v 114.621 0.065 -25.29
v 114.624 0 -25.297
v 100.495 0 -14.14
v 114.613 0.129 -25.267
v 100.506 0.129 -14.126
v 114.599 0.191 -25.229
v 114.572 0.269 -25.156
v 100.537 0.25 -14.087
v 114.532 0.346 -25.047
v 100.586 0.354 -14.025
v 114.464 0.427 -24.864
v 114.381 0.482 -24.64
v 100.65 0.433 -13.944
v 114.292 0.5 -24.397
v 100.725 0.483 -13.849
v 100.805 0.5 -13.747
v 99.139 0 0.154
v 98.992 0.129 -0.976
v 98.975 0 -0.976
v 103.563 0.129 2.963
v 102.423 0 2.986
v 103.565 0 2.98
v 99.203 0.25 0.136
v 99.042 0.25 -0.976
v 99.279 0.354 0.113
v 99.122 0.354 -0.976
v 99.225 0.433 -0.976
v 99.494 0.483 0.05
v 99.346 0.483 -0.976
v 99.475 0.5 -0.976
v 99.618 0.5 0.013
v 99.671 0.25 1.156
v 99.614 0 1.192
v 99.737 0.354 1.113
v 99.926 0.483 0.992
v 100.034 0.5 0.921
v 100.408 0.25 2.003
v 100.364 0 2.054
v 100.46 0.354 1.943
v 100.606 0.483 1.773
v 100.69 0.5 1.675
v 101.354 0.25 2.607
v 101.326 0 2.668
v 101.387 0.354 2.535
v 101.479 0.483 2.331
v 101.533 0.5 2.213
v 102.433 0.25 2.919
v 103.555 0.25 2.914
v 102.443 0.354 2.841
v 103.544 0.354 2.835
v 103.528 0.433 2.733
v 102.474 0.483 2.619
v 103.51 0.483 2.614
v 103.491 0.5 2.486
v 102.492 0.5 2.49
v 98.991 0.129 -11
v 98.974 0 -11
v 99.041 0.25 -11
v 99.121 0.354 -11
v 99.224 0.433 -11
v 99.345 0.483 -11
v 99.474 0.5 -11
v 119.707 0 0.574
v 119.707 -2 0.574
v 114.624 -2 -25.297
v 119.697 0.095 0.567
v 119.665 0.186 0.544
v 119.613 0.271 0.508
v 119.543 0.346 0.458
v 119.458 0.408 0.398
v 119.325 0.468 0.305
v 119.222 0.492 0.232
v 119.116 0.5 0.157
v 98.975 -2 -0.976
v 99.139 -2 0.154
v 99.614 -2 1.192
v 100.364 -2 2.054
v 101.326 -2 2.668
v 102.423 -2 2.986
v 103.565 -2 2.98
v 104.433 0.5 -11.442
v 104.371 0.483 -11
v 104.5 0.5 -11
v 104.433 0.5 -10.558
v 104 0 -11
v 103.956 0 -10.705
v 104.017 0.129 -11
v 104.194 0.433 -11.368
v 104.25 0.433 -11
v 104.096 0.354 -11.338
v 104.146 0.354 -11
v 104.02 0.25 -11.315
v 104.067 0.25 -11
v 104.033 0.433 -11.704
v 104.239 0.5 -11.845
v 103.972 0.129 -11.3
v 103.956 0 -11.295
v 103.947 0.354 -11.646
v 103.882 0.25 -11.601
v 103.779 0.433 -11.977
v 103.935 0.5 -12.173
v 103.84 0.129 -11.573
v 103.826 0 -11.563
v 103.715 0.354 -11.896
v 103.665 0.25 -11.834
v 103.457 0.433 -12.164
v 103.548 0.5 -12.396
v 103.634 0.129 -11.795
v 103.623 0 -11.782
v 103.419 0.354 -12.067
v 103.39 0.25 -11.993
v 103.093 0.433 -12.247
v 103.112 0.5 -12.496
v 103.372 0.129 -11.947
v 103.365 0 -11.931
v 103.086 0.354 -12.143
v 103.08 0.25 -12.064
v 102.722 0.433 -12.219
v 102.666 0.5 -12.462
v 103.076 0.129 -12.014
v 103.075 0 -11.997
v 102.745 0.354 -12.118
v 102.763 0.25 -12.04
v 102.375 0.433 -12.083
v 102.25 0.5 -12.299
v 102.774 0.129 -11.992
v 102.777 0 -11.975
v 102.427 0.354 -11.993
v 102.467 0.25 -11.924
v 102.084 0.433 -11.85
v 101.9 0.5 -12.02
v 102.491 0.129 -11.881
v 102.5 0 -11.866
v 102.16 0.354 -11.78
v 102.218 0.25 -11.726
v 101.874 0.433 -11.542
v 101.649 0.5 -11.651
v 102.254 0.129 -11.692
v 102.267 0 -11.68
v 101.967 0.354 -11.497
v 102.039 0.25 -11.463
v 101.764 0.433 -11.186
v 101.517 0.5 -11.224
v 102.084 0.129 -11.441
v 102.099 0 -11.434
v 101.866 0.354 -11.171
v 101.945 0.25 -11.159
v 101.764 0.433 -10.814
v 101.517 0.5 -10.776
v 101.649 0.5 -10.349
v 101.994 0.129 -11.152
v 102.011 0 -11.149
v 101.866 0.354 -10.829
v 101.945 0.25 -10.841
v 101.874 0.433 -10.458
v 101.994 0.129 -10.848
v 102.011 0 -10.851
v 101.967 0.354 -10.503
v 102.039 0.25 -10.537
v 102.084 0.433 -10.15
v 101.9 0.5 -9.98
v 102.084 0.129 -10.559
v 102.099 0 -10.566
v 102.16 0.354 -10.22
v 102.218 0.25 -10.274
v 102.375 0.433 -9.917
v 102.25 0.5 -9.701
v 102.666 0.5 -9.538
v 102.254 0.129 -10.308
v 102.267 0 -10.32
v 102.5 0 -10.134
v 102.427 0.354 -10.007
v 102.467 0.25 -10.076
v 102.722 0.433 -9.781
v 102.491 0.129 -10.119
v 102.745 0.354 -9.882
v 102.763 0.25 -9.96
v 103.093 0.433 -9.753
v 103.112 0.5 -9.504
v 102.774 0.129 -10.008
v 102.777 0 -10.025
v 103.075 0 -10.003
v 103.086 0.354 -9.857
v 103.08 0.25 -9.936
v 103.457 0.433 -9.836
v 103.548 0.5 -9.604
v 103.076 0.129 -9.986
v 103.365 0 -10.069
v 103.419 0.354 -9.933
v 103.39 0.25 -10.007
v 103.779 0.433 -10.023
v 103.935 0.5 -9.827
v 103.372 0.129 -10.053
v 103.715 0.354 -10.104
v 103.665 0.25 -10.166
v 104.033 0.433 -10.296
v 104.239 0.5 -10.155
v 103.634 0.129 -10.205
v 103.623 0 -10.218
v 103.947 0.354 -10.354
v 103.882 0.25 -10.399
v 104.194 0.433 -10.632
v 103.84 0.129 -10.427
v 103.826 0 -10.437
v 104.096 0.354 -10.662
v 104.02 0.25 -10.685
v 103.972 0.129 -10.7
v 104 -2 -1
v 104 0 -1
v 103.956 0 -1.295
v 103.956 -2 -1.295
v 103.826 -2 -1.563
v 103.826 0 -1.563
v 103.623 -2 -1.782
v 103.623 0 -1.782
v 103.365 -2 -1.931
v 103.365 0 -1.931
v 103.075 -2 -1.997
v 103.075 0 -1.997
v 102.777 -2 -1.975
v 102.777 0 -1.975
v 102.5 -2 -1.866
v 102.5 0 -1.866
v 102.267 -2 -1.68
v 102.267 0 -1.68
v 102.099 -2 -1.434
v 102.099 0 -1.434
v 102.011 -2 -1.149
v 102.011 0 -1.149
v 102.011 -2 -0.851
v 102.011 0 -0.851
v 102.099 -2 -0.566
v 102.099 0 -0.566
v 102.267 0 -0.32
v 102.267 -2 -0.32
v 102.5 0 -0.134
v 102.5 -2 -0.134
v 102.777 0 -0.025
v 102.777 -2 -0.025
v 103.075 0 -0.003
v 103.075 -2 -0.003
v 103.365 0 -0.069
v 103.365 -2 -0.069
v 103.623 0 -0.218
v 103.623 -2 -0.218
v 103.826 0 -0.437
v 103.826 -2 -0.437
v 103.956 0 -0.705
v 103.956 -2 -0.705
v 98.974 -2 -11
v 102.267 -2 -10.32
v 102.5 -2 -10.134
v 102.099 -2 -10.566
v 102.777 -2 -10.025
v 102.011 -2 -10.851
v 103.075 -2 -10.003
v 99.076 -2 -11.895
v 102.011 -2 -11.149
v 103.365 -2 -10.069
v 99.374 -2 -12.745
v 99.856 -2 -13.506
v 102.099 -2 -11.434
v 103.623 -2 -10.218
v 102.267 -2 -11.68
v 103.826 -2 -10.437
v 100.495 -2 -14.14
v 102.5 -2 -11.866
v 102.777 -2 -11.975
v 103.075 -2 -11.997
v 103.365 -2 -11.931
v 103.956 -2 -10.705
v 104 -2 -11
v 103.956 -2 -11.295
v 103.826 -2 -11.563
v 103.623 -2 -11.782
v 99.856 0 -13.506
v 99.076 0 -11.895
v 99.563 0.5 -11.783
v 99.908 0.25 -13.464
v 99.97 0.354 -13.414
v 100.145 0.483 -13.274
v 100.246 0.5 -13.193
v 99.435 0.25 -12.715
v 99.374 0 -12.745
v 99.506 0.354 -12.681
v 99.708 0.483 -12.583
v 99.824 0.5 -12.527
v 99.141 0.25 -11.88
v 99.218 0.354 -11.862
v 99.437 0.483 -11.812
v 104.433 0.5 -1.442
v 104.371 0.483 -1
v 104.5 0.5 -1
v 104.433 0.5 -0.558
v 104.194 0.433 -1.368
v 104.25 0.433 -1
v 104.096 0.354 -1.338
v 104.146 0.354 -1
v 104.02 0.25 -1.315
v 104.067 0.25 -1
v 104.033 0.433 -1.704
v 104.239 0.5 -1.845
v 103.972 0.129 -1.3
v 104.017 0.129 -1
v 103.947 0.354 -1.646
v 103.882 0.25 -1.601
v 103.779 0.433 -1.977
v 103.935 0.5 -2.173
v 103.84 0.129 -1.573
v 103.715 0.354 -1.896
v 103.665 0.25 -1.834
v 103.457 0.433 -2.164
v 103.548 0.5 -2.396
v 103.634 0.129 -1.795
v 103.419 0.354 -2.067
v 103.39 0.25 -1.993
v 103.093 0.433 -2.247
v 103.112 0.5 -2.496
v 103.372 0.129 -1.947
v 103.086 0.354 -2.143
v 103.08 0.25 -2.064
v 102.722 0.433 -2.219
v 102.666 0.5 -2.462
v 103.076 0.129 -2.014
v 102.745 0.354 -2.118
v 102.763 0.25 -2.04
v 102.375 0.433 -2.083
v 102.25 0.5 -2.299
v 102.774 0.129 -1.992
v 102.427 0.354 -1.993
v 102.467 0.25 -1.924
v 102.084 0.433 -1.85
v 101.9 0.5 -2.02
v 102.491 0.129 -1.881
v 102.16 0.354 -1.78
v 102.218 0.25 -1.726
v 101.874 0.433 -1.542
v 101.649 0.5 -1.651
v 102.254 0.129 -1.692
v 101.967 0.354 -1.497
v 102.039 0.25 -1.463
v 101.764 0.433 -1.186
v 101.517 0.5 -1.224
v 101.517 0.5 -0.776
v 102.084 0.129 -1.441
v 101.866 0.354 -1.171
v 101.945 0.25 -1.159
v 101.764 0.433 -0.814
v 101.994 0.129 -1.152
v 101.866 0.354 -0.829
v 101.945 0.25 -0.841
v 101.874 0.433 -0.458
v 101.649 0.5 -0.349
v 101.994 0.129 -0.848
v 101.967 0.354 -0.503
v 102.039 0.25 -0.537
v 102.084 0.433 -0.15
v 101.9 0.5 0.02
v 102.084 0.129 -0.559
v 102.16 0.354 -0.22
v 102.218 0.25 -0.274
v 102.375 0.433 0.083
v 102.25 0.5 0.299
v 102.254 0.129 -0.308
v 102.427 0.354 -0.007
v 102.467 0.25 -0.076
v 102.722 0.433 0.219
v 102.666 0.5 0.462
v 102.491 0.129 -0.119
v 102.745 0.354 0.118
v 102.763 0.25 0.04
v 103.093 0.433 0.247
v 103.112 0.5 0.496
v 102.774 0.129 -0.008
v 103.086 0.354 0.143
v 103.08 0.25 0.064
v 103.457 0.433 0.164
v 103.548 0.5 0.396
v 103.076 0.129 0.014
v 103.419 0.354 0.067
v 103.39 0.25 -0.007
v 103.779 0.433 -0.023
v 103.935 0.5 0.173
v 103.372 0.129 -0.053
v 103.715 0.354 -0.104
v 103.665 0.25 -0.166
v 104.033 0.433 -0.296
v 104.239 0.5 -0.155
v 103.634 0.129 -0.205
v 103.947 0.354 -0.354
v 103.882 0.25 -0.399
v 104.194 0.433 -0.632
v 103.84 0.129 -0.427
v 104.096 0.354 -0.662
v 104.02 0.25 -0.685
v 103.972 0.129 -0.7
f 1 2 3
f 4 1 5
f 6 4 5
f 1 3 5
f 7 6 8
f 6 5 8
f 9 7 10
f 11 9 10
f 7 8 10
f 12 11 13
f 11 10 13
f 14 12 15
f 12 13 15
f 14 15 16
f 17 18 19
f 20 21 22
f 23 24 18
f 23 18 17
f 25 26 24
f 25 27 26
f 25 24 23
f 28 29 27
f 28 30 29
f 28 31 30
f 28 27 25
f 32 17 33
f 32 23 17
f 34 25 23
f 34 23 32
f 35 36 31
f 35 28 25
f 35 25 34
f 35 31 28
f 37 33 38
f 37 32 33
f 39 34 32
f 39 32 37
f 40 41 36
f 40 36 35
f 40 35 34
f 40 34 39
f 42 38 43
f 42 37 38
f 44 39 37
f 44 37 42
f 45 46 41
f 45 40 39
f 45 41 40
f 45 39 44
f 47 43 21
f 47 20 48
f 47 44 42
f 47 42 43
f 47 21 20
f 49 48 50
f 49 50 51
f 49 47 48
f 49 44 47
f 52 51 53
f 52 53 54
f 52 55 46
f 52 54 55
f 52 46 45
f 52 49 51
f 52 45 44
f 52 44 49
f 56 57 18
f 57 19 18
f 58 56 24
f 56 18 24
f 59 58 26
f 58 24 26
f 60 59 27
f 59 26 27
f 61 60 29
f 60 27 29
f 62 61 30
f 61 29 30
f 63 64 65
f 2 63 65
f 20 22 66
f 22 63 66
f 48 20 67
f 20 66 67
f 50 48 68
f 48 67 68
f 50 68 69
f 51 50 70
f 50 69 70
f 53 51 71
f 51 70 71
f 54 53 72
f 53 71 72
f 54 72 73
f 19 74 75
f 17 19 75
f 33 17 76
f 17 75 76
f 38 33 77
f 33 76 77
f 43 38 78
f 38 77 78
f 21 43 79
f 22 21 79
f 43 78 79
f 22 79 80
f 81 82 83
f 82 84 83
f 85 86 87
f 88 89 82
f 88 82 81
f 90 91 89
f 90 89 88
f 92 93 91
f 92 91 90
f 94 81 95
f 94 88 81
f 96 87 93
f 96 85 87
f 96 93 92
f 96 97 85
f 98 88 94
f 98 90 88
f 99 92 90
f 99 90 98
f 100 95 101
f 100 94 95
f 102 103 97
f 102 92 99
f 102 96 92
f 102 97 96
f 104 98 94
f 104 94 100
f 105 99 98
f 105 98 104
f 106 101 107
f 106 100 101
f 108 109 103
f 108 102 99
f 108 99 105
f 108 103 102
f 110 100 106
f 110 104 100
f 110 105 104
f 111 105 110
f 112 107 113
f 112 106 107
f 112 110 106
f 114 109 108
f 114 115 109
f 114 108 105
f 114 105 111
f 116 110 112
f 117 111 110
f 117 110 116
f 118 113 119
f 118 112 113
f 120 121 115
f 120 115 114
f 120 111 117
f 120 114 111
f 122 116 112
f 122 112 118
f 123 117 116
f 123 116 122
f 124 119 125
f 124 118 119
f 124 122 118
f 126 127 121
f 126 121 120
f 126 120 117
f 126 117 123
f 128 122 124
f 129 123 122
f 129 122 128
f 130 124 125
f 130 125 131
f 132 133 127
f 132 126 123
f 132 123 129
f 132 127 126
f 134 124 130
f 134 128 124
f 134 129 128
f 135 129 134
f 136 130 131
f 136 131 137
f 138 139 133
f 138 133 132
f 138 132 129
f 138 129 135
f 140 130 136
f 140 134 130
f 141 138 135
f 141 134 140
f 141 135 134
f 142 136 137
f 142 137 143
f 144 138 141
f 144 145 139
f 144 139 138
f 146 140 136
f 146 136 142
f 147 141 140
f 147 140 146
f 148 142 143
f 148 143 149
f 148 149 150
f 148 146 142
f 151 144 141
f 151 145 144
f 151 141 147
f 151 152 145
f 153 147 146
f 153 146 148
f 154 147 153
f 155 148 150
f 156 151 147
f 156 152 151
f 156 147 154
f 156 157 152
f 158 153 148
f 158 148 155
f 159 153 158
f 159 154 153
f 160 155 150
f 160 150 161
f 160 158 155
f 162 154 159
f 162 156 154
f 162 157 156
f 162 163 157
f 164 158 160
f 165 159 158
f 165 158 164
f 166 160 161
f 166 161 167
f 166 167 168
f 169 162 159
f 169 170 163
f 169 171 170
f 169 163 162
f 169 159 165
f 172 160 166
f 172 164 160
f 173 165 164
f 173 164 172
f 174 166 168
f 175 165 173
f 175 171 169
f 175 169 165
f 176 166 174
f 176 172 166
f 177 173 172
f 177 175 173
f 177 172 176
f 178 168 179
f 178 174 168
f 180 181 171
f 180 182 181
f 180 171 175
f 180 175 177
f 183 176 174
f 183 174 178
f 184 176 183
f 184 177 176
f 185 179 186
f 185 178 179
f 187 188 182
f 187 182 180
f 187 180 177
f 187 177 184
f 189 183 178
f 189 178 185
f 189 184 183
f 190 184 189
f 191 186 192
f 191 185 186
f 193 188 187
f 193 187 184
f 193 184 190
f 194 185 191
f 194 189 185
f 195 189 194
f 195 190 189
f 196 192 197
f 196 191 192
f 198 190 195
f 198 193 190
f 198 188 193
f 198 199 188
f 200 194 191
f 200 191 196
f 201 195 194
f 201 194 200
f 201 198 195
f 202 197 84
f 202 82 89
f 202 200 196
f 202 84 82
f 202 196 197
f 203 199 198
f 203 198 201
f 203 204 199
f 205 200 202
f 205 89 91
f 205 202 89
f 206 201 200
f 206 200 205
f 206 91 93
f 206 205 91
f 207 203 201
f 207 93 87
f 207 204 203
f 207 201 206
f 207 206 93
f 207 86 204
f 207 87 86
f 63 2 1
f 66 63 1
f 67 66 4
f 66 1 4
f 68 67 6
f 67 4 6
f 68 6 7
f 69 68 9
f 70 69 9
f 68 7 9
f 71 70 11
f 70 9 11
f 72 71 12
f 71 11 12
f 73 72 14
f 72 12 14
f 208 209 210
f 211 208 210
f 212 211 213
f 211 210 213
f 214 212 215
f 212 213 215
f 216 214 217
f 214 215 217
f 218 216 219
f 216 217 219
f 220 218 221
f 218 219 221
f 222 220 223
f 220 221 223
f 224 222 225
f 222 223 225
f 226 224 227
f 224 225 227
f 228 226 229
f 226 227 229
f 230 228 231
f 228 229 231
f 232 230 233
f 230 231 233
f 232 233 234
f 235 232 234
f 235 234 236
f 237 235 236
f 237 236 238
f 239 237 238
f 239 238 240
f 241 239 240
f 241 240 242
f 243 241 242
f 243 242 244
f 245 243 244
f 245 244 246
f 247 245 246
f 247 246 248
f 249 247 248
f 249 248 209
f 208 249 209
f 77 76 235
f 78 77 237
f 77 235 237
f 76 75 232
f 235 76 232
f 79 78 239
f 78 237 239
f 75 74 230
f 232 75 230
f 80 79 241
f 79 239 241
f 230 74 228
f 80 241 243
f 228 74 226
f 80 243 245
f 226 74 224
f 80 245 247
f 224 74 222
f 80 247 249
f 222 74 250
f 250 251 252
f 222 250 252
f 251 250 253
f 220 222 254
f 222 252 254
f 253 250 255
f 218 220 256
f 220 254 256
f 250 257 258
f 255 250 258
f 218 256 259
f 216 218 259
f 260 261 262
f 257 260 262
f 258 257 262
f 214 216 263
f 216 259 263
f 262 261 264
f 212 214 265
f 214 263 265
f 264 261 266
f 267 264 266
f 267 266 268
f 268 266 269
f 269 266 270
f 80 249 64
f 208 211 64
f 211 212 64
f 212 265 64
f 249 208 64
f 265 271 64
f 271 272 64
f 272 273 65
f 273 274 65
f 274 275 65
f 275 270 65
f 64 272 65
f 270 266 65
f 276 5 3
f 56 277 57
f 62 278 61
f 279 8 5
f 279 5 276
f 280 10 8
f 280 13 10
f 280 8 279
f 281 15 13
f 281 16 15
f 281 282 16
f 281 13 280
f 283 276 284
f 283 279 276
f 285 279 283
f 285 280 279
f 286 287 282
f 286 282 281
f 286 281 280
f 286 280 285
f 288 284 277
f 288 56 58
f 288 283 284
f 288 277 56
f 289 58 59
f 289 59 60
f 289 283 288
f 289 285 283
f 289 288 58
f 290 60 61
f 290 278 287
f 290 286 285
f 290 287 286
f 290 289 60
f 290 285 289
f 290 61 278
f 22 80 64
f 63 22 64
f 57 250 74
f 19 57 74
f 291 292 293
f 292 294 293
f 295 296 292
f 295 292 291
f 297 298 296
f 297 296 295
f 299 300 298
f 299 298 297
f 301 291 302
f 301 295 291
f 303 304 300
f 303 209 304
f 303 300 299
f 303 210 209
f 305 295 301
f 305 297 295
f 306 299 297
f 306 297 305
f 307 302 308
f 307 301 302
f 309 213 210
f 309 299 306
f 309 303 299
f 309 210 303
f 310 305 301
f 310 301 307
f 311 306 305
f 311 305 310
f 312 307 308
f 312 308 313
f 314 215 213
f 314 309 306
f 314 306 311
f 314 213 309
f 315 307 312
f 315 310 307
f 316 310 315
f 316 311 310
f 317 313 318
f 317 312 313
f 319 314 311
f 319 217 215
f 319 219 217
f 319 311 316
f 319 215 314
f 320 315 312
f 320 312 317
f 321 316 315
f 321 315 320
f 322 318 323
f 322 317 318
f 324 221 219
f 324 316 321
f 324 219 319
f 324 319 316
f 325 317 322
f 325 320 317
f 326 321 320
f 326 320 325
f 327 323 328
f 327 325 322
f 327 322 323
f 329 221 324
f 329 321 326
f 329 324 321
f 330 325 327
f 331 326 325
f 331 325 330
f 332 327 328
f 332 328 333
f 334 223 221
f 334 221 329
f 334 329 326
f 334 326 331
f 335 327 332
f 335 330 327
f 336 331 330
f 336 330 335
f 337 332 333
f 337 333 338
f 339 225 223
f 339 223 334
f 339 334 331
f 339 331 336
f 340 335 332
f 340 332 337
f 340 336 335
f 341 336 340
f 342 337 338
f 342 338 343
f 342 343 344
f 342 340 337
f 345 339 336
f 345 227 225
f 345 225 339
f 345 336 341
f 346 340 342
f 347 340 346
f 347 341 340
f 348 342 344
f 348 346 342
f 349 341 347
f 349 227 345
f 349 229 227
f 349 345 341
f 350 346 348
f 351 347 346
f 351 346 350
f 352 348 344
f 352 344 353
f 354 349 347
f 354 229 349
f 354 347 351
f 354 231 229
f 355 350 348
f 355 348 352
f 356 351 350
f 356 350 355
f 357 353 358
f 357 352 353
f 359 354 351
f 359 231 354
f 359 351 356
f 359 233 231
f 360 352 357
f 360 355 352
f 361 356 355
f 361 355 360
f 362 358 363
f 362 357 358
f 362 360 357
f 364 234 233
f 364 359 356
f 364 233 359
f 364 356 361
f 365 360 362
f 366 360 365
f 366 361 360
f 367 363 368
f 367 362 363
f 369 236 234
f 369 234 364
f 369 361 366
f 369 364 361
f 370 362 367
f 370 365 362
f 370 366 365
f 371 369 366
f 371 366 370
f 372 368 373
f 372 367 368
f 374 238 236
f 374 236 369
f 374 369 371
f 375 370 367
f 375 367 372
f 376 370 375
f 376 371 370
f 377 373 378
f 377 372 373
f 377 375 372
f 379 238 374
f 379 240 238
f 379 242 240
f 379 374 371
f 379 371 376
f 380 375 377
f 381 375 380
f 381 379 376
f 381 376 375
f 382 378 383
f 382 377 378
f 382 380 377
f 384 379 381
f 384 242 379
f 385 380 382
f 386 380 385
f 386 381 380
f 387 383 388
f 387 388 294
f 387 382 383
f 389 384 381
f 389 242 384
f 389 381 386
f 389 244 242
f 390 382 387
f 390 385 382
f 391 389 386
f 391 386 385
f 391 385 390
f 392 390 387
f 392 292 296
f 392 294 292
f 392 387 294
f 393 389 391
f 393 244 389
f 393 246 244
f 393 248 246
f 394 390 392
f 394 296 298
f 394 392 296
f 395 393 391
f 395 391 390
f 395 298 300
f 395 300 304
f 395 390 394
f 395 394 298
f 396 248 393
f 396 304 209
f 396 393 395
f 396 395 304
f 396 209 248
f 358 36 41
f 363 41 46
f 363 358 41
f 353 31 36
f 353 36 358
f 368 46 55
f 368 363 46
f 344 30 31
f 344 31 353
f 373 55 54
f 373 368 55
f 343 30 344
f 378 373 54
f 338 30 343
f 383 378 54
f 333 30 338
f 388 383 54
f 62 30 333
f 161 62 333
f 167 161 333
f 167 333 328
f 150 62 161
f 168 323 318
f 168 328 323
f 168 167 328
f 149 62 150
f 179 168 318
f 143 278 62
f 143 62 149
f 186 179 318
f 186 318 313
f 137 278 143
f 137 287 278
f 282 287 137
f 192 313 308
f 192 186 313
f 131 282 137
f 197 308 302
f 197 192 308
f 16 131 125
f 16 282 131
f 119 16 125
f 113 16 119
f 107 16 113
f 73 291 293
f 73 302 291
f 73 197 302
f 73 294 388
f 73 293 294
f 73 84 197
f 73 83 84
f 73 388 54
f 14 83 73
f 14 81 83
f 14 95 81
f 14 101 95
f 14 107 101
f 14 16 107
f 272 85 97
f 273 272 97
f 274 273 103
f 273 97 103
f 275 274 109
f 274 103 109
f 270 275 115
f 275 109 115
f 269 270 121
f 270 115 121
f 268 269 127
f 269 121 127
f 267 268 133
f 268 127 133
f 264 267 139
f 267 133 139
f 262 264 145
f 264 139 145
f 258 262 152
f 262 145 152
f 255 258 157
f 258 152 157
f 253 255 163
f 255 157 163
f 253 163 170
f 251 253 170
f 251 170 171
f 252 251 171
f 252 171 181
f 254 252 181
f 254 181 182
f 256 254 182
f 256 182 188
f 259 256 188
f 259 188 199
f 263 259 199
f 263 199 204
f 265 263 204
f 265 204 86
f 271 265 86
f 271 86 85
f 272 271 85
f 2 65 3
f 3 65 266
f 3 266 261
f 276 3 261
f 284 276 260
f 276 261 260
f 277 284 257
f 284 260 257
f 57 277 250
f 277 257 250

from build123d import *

# Parameters (mm, degrees)
PAD004_DEPTH    = 2.5
SKETCH011_R     = 1
POCKET002_DEPTH = 3
FILLET_R        = 0.5


with BuildPart() as part:
    # Sketch006 → Pad004 (new body)
    with BuildSketch(Plane(origin=(43, -2, 9), x_dir=(1, 0, 0), z_dir=(0, 1, 0))):
        with BuildLine():
            Line((71.624302, 34.297205), (57.4953, 23.139806))
            ThreePointArc((57.4953, 23.139806), (56.374461, 21.744531), (55.974277, 20.000133))
            Line((55.974277, 20.000133), (55.975425, 9.975673))
            ThreePointArc((55.975425, 9.975673), (57.363966, 6.946234), (60.565113, 6.019837))
            Line((60.565113, 6.019837), (76.707381, 8.42585))
            Line((76.707381, 8.42585), (71.624302, 34.297205))
        make_face()
    extrude(amount=PAD004_DEPTH)

    # Sketch011 → Pocket002 (cut)
    with BuildSketch(Plane(origin=(43, 0.5, 9), x_dir=(1, 0, 0), z_dir=(0, 1, 0))):
        with Locations((60, 20)):
            Circle(SKETCH011_R)
        with Locations((60, 10)):
            Circle(SKETCH011_R)
    extrude(amount=-POCKET002_DEPTH, mode=Mode.SUBTRACT)

    # Fillet
    fillet_edges = [part.edges().sort_by_distance(p)[0] for p in [
        (107.559801, 0.5, -19.718506),
        (117.165842, 0.5, -12.361528),
        (99.374461, 0.5, -12.744531),
        (111.636247, 0.5, 1.777156),
        (98.974851, 0.5, -5.987903),
        (100.363966, 0.5, 2.053766),
        (102, 0.5, -1),
        (102, 0.5, -11),
    ]]
    fillet(fillet_edges, radius=FILLET_R)


solid = part.part
